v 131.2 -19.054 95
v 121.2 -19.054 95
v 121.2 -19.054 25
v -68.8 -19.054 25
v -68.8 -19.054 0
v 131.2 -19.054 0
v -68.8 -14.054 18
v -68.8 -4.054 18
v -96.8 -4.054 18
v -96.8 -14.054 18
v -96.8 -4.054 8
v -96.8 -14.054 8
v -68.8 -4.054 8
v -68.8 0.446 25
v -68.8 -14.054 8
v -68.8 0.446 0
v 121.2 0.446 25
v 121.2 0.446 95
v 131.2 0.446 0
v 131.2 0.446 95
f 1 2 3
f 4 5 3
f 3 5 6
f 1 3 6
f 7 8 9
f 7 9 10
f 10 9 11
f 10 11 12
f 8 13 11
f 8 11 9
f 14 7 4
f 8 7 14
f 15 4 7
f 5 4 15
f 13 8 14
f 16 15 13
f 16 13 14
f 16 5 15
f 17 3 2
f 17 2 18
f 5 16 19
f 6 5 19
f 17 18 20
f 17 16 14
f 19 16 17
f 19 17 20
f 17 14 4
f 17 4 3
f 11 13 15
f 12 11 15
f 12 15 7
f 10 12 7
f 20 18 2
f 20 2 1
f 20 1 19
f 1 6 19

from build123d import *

# Parameters (mm, degrees)
F0_W     = 190
F0_H     = 19.5
F0_W_2   = 10
F1_DEPTH = 25
F2_W     = 10
F2_H     = 19.5
F3_DEPTH = 70
F4_W     = 10
F4_H     = 10
F5_DEPTH = 28


with BuildPart() as f1:
    # F0 (on Top) → F1 (new body)
    with BuildSketch(Plane.XY):
        with Locations((26.199683, -9.304239)):
            Rectangle(F0_W, F0_H)
        with Locations((126.199683, -9.304239)):
            Rectangle(F0_W_2, F0_H)
    extrude(amount=F1_DEPTH)

    # F2 (on face) → F3 (join)
    with BuildSketch(Plane.XY.offset(25)):
        with Locations((126.199683, -9.304239)):
            Rectangle(F2_W, F2_H)
    extrude(amount=F3_DEPTH)

    # F4 (on face) → F5 (join)
    with BuildSketch(Plane(origin=(-68.800317, 0, 0), x_dir=(0, -1, 0), z_dir=(-1, 0, 0))):
        with Locations((9.054239, 13)):
            Rectangle(F4_W, F4_H)
    extrude(amount=F5_DEPTH)


solid = f1.part
